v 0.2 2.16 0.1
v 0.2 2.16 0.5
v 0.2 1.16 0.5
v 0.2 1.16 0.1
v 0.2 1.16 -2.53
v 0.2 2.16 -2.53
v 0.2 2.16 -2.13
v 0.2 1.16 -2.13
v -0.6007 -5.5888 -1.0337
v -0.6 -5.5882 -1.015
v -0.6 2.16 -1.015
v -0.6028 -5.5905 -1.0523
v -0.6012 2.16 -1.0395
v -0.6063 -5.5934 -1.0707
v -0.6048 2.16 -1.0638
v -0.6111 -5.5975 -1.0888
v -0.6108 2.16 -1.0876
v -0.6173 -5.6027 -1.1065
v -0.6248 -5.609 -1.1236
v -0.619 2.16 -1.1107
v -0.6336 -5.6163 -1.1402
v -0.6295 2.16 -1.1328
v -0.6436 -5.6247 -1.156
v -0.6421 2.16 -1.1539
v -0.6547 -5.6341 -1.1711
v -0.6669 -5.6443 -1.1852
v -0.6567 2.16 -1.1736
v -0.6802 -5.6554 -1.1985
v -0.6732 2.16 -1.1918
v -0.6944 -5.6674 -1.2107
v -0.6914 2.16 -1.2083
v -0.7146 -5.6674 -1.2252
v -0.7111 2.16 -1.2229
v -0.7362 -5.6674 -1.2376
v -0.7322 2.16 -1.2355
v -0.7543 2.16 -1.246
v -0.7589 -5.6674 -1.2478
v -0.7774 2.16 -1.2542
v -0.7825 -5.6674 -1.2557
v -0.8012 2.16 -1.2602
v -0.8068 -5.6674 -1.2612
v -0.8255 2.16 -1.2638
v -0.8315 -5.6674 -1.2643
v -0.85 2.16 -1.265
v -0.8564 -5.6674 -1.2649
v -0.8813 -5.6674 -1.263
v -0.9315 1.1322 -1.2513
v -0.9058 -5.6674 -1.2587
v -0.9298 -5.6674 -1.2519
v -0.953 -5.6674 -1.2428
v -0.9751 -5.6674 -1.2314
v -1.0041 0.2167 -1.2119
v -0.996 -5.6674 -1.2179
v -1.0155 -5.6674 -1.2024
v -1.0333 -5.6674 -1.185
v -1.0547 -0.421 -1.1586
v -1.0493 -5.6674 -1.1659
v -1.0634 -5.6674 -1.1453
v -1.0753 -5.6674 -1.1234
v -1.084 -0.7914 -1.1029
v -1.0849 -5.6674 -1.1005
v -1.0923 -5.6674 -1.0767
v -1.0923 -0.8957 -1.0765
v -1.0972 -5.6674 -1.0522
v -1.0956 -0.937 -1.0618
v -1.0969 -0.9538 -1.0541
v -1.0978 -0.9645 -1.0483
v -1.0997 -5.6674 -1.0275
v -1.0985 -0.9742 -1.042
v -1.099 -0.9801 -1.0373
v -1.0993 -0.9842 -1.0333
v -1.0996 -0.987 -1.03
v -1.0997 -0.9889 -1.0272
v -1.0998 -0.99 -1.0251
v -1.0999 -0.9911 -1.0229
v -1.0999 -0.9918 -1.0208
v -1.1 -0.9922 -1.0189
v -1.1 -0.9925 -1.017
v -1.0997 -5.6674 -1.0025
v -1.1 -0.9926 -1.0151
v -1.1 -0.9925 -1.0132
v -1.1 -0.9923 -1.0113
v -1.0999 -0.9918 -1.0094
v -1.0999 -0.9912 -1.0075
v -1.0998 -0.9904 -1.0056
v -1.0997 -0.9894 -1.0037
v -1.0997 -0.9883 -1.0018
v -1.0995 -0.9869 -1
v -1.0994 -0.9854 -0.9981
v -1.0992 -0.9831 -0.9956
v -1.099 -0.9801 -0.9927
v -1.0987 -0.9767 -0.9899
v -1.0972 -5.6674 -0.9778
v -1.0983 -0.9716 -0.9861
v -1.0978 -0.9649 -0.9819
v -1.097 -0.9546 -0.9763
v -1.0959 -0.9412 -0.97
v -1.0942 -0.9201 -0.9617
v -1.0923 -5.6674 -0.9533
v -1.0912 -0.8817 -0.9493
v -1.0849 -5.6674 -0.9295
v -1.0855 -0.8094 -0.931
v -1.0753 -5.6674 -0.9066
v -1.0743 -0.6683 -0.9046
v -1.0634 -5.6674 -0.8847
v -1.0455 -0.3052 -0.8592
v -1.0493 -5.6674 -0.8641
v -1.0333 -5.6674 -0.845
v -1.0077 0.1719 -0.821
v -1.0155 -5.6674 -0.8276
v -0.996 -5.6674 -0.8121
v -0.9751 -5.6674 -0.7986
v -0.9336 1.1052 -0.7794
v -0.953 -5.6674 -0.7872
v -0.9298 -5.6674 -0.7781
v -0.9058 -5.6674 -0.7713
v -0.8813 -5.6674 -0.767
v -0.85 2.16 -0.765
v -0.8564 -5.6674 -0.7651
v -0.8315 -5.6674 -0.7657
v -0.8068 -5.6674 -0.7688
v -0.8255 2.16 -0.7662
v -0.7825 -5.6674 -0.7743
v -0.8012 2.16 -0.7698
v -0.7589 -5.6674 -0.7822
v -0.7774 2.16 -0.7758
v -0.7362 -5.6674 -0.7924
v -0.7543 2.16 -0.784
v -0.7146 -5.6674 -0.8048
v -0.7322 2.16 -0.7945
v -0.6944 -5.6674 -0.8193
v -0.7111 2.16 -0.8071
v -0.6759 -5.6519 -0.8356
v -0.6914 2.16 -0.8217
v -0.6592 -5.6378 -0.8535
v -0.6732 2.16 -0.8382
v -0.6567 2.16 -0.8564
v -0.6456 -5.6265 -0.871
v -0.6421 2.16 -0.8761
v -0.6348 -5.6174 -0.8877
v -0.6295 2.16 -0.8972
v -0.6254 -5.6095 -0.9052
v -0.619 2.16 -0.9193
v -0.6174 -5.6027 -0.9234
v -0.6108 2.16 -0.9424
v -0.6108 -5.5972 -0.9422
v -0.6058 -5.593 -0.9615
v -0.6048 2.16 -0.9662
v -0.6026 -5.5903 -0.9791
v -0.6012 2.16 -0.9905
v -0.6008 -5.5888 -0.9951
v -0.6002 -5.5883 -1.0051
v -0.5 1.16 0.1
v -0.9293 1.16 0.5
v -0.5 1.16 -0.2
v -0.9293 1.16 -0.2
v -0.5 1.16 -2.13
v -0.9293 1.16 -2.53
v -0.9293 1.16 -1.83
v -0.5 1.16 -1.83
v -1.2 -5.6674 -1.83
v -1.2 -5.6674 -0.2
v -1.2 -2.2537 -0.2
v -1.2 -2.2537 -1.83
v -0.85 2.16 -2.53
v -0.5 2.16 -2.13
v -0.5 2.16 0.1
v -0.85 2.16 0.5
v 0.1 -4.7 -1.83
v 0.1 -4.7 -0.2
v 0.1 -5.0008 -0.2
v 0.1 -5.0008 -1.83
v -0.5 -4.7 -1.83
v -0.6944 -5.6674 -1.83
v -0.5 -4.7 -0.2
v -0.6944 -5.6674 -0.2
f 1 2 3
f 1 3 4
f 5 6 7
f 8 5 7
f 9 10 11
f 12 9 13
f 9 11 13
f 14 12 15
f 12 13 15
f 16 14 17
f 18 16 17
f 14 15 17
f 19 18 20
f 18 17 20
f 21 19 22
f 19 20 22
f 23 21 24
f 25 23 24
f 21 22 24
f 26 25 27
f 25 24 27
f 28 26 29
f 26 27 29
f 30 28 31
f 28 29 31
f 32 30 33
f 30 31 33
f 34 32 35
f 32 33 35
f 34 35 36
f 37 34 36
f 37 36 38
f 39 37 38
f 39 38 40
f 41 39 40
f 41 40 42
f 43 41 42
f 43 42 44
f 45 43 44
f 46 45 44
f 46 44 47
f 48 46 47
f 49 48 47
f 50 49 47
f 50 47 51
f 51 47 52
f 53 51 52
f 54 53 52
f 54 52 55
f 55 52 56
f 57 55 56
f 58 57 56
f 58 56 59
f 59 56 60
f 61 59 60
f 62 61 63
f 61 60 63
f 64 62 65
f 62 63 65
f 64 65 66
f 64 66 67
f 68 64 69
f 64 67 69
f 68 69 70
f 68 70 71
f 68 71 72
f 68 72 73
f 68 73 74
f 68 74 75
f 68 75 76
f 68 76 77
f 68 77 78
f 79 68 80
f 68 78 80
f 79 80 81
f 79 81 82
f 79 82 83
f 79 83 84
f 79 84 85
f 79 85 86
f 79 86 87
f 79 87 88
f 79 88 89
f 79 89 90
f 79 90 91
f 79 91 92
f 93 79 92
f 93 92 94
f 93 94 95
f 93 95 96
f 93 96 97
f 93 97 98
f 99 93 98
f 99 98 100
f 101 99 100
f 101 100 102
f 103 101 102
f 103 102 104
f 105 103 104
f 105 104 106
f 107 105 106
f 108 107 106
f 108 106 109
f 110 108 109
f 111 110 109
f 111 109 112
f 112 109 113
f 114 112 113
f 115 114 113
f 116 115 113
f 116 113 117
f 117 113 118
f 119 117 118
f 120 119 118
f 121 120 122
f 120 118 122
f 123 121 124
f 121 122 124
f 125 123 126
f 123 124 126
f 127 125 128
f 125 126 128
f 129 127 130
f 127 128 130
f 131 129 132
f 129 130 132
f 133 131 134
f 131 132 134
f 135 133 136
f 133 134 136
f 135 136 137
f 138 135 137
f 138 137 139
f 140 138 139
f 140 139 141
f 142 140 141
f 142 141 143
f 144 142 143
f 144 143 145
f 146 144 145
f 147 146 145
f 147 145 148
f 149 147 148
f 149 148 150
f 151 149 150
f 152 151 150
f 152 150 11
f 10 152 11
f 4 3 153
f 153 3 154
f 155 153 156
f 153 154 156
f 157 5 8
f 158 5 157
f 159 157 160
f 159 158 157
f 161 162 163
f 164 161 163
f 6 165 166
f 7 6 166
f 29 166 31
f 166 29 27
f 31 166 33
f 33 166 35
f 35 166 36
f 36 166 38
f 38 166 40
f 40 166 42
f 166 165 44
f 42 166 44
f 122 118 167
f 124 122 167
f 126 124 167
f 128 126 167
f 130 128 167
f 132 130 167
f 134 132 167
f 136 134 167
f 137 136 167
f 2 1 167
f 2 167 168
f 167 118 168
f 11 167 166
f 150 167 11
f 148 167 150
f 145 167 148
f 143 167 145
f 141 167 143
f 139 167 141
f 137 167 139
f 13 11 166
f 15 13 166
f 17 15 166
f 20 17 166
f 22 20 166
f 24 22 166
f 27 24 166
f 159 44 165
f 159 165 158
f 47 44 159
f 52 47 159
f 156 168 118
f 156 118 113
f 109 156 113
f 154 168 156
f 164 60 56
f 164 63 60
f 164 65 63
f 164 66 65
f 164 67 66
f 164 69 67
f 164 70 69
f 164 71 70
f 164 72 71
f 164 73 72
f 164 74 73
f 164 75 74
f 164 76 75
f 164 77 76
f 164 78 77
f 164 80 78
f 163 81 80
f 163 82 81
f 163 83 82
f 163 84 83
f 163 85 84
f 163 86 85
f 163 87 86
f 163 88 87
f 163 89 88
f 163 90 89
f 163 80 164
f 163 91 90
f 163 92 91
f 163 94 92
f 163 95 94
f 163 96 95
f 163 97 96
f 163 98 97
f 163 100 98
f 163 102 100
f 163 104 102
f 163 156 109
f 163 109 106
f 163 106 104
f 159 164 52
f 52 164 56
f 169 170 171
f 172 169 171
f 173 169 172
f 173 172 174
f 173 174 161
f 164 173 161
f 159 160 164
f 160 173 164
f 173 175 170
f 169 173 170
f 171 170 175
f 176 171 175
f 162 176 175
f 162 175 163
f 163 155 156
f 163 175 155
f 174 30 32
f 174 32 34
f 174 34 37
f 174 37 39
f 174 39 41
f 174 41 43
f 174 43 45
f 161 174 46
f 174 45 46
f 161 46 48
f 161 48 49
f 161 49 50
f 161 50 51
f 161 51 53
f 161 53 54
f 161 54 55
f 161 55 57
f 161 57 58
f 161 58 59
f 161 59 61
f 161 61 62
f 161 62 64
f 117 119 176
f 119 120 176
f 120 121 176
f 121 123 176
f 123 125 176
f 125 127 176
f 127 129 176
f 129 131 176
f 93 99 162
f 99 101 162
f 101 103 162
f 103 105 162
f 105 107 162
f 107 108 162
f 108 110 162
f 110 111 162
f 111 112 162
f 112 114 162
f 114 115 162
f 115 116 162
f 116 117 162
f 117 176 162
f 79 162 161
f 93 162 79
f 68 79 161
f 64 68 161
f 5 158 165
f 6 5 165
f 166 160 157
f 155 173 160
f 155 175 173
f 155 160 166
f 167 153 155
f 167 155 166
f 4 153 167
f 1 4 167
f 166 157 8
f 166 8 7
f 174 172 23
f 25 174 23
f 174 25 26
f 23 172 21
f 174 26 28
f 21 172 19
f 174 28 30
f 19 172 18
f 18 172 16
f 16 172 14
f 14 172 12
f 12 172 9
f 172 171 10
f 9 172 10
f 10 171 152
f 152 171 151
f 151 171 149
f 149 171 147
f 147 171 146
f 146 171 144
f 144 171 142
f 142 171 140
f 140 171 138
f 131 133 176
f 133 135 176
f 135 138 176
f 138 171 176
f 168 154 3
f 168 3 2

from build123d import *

# Parameters (mm, degrees)
BOSS_EXTRUDE2_START     = -0.2
BOSS_EXTRUDE2_DEPTH     = 1.63
SKETCH5_W               = 0.7
SKETCH5_H               = 1
BOSS_EXTRUDE4_DEPTH     = 0.7
SKETCH6_W               = 0.4
SKETCH6_H               = 1
BOSS_EXTRUDE5_DEPTH     = 0.7
CUT_EXTRUDE1_DEPTH      = 0.7
CUT_EXTRUDE1_DEPTH_BACK = 3.33
SKETCH7_R               = 0.25
CUT_EXTRUDE2_DEPTH      = 8.827352199


with BuildPart() as part:
    # Sketch2 → Boss-Extrude2 (new body)
    with BuildSketch(Plane.XY.offset(BOSS_EXTRUDE2_START)):
        Polygon((-0.5, 2.16), (-0.5, -4.7), (0.1, -4.7), (0.1, -5.000793217), (-0.694374061, -5.667352199), (-1.2, -5.667352199), (-1.2, 2.16), align=None)
    extrude(amount=-BOSS_EXTRUDE2_DEPTH)

    # Sketch5 → Boss-Extrude4 (add)
    with BuildSketch(Plane.XY.offset(-0.2)):
        with Locations((-0.85, 1.66)):
            Rectangle(SKETCH5_W, SKETCH5_H)
    boss_extrude4 = extrude(amount=BOSS_EXTRUDE4_DEPTH)

    # Sketch6 → Boss-Extrude5 (add)
    with BuildSketch(Plane(origin=(-0.5, 0, 0), x_dir=(0, 0, -1), z_dir=(1, 0, 0))):
        with Locations((-0.3, 1.66)):
            Rectangle(SKETCH6_W, SKETCH6_H)
    boss_extrude5 = extrude(amount=BOSS_EXTRUDE5_DEPTH)

    # Mirror1: Boss-Extrude4, Boss-Extrude5 across plane
    add(boss_extrude4.mirror(Plane.XY.offset(-1.015)))
    add(boss_extrude5.mirror(Plane.XY.offset(-1.015)))

    # Sketch3 → Cut-Extrude1 (cut, two sides)
    with BuildSketch(Plane.XY.offset(-0.2)) as cut_extrude1_sk:
        Polygon((-0.85, 2.16), (-1.2, -2.2536761), (-1.2, 2.16), align=None)
    extrude(amount=CUT_EXTRUDE1_DEPTH, mode=Mode.SUBTRACT)
    extrude(cut_extrude1_sk.sketch, amount=-CUT_EXTRUDE1_DEPTH_BACK, mode=Mode.SUBTRACT)

    # Sketch7 → Cut-Extrude2 (cut, through all)
    with BuildSketch(Plane(origin=(0, 2.16, 0), x_dir=(1, 0, 0), z_dir=(0, 1, 0))):
        with Locations((-0.85, 1.015)):
            Circle(SKETCH7_R)
    extrude(amount=-CUT_EXTRUDE2_DEPTH, mode=Mode.SUBTRACT)


solid = part.part
